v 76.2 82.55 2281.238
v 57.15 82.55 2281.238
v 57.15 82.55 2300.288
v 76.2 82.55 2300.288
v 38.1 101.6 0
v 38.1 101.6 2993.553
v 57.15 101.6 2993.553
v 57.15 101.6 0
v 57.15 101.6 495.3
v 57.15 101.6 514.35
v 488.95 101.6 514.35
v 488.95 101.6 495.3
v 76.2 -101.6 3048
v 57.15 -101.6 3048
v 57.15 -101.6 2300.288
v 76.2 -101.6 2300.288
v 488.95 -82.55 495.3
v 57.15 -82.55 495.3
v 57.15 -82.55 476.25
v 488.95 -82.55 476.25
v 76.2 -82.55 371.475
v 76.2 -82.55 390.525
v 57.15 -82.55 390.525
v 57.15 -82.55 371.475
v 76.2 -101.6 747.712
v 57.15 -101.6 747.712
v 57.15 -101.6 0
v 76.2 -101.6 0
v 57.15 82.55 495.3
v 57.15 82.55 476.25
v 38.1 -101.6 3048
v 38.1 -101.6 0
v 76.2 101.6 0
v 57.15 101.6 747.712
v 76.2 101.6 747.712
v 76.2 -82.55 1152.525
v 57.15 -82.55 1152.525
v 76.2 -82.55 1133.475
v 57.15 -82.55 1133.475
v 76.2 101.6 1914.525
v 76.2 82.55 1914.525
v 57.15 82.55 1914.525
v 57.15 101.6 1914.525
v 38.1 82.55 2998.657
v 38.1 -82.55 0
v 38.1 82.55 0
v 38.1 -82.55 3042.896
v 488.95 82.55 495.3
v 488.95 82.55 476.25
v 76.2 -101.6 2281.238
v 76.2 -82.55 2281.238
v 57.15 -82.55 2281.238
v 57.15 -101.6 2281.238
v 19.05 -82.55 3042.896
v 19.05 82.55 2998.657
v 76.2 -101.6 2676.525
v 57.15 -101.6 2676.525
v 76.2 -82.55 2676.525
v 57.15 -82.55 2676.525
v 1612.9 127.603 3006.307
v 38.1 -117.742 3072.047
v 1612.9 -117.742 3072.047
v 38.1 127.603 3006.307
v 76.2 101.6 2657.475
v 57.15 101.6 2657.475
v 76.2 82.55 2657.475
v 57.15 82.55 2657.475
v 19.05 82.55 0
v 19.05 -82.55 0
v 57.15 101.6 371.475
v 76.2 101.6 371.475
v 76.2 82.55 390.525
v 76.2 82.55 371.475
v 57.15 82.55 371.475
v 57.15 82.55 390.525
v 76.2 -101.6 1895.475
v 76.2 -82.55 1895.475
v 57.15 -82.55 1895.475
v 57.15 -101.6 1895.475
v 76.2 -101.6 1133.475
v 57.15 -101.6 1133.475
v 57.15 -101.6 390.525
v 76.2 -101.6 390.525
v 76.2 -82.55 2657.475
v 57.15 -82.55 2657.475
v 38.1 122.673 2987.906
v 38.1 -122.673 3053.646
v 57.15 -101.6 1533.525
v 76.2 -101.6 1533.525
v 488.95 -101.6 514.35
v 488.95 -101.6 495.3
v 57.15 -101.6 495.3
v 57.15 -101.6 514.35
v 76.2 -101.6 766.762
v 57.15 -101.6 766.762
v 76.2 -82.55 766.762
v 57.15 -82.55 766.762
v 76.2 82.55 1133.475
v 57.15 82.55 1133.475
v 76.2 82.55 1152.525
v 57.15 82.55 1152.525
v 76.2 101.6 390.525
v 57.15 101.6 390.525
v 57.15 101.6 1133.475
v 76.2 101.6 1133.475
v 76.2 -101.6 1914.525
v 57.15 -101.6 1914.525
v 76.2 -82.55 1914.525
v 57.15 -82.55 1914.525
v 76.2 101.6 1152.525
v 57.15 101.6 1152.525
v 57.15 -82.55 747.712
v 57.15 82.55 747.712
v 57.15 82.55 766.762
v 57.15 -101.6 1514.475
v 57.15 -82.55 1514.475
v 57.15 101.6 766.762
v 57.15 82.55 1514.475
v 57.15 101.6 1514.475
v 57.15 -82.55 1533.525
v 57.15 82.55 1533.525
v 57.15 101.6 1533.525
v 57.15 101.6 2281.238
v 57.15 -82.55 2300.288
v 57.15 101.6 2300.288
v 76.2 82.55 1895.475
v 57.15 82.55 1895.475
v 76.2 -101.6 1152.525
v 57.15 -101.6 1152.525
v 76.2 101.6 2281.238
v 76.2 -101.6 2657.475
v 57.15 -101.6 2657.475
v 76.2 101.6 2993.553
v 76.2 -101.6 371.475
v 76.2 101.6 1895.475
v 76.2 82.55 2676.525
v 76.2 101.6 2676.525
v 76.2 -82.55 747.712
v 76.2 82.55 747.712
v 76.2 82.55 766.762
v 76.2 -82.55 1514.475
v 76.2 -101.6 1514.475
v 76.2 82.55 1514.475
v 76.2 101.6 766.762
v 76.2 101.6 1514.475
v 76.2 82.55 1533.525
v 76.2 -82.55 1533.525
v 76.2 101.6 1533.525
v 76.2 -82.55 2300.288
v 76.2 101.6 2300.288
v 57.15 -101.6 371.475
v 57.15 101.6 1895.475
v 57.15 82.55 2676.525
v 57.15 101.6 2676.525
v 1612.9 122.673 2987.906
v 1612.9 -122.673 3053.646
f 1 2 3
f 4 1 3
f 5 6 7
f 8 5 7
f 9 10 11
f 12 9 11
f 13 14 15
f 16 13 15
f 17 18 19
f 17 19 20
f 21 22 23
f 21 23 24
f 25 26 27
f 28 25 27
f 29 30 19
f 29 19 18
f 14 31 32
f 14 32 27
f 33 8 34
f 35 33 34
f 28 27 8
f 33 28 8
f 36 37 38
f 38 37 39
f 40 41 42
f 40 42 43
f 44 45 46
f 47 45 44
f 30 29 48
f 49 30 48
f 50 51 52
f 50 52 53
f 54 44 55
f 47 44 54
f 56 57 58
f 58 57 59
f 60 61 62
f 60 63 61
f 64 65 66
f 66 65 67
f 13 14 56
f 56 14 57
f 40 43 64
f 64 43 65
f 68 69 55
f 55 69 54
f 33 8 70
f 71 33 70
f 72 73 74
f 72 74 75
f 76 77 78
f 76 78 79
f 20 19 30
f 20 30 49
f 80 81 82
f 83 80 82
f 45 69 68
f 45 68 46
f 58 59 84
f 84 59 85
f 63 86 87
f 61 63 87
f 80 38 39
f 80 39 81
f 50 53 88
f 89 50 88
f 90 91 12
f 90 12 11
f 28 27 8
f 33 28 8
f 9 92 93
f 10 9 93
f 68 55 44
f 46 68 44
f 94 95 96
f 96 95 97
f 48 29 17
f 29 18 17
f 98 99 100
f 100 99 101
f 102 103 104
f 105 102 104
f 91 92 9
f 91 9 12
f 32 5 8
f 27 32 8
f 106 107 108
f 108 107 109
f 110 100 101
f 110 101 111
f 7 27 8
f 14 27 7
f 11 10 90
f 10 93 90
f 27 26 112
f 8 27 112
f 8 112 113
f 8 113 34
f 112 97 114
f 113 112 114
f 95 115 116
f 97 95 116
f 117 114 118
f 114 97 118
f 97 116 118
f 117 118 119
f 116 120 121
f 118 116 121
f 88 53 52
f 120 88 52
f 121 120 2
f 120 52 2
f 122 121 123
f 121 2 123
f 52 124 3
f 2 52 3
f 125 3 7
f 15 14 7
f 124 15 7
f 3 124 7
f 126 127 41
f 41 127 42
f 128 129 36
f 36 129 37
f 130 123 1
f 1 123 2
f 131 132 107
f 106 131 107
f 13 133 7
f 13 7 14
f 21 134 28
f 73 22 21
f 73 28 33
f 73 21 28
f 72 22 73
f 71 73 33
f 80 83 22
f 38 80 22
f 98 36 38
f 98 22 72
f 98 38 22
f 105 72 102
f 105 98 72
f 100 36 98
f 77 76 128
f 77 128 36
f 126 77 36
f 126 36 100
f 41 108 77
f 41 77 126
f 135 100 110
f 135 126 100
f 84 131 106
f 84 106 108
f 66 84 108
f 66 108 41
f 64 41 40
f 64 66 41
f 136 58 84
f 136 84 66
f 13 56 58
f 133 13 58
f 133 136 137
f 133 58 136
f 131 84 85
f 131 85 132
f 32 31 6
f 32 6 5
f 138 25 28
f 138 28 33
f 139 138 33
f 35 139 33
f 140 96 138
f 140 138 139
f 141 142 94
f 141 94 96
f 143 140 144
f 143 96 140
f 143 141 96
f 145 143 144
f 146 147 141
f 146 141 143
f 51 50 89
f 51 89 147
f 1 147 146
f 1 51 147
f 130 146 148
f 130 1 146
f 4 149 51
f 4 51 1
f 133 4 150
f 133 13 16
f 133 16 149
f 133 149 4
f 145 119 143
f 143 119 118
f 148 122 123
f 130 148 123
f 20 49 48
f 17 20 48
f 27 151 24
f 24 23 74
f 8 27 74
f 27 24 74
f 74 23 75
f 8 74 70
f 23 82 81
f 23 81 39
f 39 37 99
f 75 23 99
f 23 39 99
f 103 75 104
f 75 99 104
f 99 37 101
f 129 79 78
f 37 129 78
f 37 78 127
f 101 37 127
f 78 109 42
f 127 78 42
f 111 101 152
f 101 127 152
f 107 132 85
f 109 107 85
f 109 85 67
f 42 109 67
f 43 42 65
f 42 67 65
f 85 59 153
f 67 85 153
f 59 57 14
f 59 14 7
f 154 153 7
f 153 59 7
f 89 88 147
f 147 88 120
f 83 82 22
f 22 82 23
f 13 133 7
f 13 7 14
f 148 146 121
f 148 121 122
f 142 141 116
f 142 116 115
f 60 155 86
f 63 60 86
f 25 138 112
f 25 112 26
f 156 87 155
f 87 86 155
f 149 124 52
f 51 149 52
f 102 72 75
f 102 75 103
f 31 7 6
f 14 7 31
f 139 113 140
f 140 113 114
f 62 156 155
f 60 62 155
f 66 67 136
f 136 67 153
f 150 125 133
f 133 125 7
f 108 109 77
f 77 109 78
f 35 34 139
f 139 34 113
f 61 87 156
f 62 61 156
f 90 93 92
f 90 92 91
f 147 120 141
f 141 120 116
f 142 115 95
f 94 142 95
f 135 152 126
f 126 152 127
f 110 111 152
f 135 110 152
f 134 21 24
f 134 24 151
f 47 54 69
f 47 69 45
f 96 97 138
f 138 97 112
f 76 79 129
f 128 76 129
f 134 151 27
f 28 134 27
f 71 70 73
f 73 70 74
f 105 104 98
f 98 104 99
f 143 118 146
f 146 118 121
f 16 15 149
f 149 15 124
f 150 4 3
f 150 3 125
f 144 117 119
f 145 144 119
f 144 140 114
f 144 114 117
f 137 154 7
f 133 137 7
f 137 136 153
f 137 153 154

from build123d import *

# Parameters (mm, degrees)
F1_W           = 431.8
F1_H           = 19.05
F2_DEPTH       = 101.6
F1_W_2         = 19.05
F1_H_2         = 3048
F3_DEPTH       = 82.55
F4_DEPTH       = 101.6
F6_DEPTH       = 19.05
F8_DEPTH       = 19.05
F10_DEPTH      = 450.851
F10_DEPTH_BACK = 19.051
F12_DEPTH      = 19.05


with BuildPart() as f2:
    # F1 (on Front) → F2 (new body, symmetric)
    with BuildSketch(Plane.XZ):
        with Locations((273.05, 504.825)):
            Rectangle(F1_W, F1_H)
    extrude(amount=F2_DEPTH, both=True)


with BuildPart() as f3:
    # F1 (on Front) → F3 (new body, symmetric)
    with BuildSketch(Plane.XZ):
        with Locations((28.575, 1524)):
            Rectangle(F1_W_2, F1_H_2)
    extrude(amount=F3_DEPTH, both=True)


with BuildPart() as f3b:
    # F1 (on Front) → F3, piece 2 (new body, symmetric)
    with BuildSketch(Plane.XZ):
        with Locations((273.05, 485.775)):
            Rectangle(F1_W, F1_H)
    extrude(amount=F3_DEPTH, both=True)


with BuildPart() as f4:
    # F1 (on Front) → F4 (new body, symmetric)
    with BuildSketch(Plane.XZ):
        Polygon((38.1, 3048), (38.1, 0), (57.15, 0), (57.15, 457.2), (57.15, 476.25), (57.15, 495.3), (57.15, 514.35), (57.15, 3048), align=None)
    extrude(amount=F4_DEPTH, both=True)


with BuildPart() as f6:
    # F5 (on face) → F6 (new body)
    with BuildSketch(Plane.YZ.offset(57.15)):
        Polygon((-82.55, 371.475), (-101.6, 371.475), (-101.6, 0), (101.6, 0), (101.6, 371.475), (82.55, 371.475), (82.55, 390.525), (101.6, 390.525), (101.6, 1133.475), (82.55, 1133.475), (82.55, 1152.525), (101.6, 1152.525), (101.6, 1895.475), (82.55, 1895.475), (82.55, 1914.525), (101.6, 1914.525), (101.6, 2657.475), (82.55, 2657.475), (82.55, 2676.525), (101.6, 2676.525), (101.6, 3048), (-101.6, 3048), (-101.6, 2676.525), (-82.55, 2676.525), (-82.55, 2657.475), (-101.6, 2657.475), (-101.6, 1914.525), (-82.55, 1914.525), (-82.55, 1895.475), (-101.6, 1895.475), (-101.6, 1152.525), (-82.55, 1152.525), (-82.55, 1133.475), (-101.6, 1133.475), (-101.6, 390.525), (-82.55, 390.525), align=None)
    extrude(amount=F6_DEPTH)


with BuildPart() as f8:
    # F7 (on face) → F8 (new body)
    with BuildSketch(Plane.YZ.offset(57.15)):
        Polygon((-101.6, 747.7125), (-101.6, 0), (-82.55, 0), (82.55, 0), (101.6, 0), (101.6, 747.7125), (82.55, 747.7125), (82.55, 766.7625), (101.6, 766.7625), (101.6, 1514.475), (82.55, 1514.475), (82.55, 1533.525), (101.6, 1533.525), (101.6, 2281.2375), (82.55, 2281.2375), (82.55, 2300.2875), (101.6, 2300.2875), (101.6, 3048), (82.55, 3048), (-82.55, 3048), (-101.6, 3048), (-101.6, 2300.2875), (-82.55, 2300.2875), (-82.55, 2281.2375), (-101.6, 2281.2375), (-101.6, 1533.525), (-82.55, 1533.525), (-82.55, 1514.475), (-101.6, 1514.475), (-101.6, 766.7625), (-82.55, 766.7625), (-82.55, 747.7125), align=None)
    extrude(amount=F8_DEPTH)


with BuildPart() as f10_tool:
    # F9 (on face) → F10 (new body, two sides)
    with BuildSketch(Plane(origin=(38.1, 0, 0), x_dir=(0, -1, 0), z_dir=(-1, 0, 0))) as f10_sk:
        Polygon((-101.6, 2993.552724098), (101.6, 3048), (-101.6, 3048), align=None)
    extrude(amount=-F10_DEPTH)
    extrude(f10_sk.sketch, amount=F10_DEPTH_BACK)


with BuildPart() as f3_1:
    add(f3.part)

    # F10: cut by f10_tool
    add(f10_tool.part, mode=Mode.SUBTRACT)


with BuildPart() as f4_1:
    add(f4.part)

    # F10: cut by f10_tool
    add(f10_tool.part, mode=Mode.SUBTRACT)


with BuildPart() as f6_1:
    add(f6.part)

    # F10: cut by f10_tool
    add(f10_tool.part, mode=Mode.SUBTRACT)


with BuildPart() as f8_1:
    add(f8.part)

    # F10: cut by f10_tool
    add(f10_tool.part, mode=Mode.SUBTRACT)


with BuildPart() as f12:
    # F11 (on face) → F12 (new body)
    with BuildSketch(Plane(origin=(0, 755.1940905122, 2818.4227153675), x_dir=(1, 0, 0), z_dir=(0, 0.2588190451, 0.9659258263))):
        Polygon((38.1, -887.0185134235), (38.1, -908.8344534938), (1612.9, -908.8344534938), (1612.9, -654.8344534938), (38.1, -654.8344534938), (38.1, -676.6503935641), (57.15, -676.6503935641), (57.15, -887.0185134235), align=None)
        Polygon((38.1, -867.2965021866), (38.1, -887.0185134235), (57.15, -887.0185134235), (57.15, -676.6503935641), (38.1, -676.6503935641), (38.1, -696.3724048009), align=None)
    extrude(amount=F12_DEPTH)


solid = Compound([f2.part, f3b.part, f3_1.part, f4_1.part, f6_1.part, f8_1.part, f12.part])
